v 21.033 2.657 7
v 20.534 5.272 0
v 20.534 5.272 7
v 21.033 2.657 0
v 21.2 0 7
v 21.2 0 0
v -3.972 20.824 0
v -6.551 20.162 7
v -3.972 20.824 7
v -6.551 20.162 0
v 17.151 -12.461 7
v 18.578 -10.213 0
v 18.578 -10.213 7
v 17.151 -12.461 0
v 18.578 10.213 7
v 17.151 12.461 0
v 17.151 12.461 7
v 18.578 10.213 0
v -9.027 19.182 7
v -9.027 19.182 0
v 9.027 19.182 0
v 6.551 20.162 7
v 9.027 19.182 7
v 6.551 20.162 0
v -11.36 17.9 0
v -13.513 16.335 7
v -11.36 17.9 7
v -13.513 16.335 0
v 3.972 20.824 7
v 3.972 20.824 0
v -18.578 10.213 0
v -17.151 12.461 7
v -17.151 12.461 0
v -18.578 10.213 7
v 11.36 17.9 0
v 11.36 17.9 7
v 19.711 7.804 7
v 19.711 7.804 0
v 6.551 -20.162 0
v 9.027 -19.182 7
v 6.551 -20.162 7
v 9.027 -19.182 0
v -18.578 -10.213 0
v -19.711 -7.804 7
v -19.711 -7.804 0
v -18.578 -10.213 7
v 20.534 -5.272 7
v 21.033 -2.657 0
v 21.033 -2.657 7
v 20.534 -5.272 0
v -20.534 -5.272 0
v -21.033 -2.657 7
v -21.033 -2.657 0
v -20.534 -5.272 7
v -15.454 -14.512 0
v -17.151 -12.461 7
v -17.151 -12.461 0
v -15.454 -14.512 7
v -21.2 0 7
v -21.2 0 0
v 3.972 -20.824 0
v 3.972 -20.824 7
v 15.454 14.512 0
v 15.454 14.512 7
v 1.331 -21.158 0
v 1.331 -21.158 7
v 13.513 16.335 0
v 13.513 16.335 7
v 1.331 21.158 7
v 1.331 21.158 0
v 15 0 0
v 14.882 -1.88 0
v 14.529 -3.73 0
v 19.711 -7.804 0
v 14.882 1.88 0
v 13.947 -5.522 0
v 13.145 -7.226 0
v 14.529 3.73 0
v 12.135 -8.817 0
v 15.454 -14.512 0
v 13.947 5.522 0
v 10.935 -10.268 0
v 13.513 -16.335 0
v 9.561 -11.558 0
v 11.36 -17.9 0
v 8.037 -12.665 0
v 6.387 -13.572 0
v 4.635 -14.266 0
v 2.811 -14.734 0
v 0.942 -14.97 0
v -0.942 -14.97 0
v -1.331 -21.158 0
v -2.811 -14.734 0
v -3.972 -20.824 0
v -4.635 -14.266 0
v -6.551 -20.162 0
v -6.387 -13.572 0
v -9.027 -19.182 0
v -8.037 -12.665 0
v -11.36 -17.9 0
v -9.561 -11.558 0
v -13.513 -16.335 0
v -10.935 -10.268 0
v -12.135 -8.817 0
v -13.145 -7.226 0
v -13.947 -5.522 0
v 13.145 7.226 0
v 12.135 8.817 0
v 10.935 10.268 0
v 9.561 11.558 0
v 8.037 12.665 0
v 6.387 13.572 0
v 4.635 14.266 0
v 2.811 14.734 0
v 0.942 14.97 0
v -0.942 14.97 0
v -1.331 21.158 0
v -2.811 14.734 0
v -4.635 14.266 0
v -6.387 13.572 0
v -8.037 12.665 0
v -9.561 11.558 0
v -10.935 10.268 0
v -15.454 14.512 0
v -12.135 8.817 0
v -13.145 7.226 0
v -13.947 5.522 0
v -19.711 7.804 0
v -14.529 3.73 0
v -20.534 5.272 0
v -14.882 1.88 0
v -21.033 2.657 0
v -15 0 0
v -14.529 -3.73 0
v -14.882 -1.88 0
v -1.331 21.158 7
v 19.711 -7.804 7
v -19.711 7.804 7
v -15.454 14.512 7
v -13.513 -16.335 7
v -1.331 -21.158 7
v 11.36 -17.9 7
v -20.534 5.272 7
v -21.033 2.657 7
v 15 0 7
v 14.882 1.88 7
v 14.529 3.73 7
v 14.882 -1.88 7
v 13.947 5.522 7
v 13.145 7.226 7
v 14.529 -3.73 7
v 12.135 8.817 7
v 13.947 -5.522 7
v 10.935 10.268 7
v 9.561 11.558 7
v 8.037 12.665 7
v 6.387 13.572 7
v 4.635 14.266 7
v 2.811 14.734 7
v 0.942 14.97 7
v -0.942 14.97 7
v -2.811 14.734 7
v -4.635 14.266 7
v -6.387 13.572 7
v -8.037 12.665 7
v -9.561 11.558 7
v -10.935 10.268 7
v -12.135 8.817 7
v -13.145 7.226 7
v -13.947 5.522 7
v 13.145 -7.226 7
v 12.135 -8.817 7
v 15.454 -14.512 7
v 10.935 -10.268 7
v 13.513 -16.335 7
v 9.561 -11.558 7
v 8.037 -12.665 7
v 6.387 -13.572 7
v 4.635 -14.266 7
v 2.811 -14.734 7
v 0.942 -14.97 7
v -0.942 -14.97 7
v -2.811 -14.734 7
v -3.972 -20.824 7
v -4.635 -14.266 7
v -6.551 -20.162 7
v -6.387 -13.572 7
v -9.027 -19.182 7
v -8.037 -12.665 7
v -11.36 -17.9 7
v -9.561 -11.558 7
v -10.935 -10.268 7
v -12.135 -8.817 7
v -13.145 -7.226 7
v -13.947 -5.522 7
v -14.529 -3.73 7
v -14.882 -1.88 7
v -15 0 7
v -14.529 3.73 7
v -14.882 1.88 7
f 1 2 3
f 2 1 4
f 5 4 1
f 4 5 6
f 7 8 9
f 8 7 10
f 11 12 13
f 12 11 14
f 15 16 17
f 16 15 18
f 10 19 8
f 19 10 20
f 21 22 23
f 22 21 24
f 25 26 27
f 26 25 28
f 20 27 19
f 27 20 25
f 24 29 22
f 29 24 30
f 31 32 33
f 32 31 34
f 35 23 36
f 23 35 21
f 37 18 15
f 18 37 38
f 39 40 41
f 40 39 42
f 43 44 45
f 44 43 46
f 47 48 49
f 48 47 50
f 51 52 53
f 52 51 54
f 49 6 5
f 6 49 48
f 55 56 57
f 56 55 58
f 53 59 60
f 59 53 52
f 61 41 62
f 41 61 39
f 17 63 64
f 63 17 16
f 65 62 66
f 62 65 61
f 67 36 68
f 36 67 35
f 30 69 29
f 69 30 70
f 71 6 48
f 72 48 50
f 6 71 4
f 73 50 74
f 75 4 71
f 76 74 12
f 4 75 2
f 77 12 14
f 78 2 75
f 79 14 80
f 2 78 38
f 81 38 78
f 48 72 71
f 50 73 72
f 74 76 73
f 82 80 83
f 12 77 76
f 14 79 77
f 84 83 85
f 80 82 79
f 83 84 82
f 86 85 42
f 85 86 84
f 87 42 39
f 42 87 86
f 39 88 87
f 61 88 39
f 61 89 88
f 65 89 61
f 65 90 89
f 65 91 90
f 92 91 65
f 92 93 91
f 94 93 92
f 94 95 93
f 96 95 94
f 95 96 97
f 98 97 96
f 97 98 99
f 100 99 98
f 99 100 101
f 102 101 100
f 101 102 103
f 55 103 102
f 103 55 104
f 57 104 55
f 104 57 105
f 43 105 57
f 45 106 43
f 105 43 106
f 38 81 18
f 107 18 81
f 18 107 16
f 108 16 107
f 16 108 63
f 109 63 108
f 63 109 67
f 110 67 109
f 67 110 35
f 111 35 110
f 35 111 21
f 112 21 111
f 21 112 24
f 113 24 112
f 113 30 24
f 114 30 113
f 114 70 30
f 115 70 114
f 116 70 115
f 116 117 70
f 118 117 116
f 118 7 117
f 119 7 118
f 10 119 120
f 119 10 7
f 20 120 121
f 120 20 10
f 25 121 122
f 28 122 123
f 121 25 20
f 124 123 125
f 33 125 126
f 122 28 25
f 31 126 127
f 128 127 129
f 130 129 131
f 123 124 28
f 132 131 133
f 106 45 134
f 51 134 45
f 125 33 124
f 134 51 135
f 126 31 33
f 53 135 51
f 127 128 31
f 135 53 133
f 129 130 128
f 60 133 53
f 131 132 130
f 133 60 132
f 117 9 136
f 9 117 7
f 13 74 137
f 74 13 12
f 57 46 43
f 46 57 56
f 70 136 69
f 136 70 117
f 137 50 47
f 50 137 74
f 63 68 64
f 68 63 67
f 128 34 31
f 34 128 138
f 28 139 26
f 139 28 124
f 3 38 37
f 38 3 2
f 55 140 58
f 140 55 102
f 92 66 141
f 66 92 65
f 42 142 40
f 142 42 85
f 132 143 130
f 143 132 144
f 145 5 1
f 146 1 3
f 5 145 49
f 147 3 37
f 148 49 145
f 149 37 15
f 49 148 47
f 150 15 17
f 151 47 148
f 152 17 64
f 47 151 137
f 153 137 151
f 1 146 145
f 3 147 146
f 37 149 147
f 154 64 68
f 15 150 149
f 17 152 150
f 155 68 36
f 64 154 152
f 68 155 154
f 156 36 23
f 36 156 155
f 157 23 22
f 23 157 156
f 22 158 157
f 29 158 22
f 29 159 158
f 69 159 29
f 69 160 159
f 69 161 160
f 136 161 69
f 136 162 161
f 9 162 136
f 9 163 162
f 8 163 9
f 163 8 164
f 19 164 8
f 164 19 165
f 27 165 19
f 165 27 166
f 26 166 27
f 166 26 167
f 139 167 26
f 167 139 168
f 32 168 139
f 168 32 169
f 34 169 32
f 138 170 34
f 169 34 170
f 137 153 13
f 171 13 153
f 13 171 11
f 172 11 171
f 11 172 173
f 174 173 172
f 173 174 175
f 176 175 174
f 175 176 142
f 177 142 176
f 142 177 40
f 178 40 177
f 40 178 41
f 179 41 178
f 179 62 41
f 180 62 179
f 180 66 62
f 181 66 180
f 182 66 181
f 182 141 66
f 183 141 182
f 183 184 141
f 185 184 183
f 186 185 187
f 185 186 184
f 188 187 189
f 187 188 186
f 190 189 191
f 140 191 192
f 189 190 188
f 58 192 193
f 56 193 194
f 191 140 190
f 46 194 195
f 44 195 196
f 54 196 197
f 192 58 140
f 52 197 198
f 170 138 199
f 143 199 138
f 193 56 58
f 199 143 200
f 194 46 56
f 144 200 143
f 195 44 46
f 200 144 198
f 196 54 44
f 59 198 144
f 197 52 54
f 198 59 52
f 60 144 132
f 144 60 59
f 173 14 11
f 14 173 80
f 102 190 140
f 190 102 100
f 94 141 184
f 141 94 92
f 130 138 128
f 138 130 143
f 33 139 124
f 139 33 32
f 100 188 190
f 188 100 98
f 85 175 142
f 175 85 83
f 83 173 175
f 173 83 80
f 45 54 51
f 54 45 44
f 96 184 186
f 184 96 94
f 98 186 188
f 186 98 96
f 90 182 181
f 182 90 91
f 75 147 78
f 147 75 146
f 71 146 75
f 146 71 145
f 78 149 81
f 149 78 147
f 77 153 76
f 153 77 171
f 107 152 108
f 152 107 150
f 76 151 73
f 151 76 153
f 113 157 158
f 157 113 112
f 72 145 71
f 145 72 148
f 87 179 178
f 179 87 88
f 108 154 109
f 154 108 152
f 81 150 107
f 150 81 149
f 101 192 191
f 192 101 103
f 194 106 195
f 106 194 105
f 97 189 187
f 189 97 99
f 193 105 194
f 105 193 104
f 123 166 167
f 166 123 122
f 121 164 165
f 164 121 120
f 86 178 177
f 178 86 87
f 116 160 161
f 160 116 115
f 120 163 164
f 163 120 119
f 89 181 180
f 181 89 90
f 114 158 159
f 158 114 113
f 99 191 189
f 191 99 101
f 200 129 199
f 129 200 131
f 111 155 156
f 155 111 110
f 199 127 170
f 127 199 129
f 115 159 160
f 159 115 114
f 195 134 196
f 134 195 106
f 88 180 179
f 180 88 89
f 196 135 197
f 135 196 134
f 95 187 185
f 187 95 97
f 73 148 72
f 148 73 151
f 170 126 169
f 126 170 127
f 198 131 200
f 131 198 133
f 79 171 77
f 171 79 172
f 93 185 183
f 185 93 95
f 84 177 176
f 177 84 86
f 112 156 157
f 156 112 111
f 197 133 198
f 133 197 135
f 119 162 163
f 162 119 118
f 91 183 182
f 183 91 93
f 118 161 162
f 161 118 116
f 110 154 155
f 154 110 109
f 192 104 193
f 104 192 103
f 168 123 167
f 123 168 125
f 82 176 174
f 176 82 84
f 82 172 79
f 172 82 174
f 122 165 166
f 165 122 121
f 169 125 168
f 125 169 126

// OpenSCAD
$fn = 50;


difference() {
	union() {
		cylinder(h = 7, r = 21.2000000000);
	}
	union() {
		cylinder(h = 7, r = 15.0000000000);
	}
}
